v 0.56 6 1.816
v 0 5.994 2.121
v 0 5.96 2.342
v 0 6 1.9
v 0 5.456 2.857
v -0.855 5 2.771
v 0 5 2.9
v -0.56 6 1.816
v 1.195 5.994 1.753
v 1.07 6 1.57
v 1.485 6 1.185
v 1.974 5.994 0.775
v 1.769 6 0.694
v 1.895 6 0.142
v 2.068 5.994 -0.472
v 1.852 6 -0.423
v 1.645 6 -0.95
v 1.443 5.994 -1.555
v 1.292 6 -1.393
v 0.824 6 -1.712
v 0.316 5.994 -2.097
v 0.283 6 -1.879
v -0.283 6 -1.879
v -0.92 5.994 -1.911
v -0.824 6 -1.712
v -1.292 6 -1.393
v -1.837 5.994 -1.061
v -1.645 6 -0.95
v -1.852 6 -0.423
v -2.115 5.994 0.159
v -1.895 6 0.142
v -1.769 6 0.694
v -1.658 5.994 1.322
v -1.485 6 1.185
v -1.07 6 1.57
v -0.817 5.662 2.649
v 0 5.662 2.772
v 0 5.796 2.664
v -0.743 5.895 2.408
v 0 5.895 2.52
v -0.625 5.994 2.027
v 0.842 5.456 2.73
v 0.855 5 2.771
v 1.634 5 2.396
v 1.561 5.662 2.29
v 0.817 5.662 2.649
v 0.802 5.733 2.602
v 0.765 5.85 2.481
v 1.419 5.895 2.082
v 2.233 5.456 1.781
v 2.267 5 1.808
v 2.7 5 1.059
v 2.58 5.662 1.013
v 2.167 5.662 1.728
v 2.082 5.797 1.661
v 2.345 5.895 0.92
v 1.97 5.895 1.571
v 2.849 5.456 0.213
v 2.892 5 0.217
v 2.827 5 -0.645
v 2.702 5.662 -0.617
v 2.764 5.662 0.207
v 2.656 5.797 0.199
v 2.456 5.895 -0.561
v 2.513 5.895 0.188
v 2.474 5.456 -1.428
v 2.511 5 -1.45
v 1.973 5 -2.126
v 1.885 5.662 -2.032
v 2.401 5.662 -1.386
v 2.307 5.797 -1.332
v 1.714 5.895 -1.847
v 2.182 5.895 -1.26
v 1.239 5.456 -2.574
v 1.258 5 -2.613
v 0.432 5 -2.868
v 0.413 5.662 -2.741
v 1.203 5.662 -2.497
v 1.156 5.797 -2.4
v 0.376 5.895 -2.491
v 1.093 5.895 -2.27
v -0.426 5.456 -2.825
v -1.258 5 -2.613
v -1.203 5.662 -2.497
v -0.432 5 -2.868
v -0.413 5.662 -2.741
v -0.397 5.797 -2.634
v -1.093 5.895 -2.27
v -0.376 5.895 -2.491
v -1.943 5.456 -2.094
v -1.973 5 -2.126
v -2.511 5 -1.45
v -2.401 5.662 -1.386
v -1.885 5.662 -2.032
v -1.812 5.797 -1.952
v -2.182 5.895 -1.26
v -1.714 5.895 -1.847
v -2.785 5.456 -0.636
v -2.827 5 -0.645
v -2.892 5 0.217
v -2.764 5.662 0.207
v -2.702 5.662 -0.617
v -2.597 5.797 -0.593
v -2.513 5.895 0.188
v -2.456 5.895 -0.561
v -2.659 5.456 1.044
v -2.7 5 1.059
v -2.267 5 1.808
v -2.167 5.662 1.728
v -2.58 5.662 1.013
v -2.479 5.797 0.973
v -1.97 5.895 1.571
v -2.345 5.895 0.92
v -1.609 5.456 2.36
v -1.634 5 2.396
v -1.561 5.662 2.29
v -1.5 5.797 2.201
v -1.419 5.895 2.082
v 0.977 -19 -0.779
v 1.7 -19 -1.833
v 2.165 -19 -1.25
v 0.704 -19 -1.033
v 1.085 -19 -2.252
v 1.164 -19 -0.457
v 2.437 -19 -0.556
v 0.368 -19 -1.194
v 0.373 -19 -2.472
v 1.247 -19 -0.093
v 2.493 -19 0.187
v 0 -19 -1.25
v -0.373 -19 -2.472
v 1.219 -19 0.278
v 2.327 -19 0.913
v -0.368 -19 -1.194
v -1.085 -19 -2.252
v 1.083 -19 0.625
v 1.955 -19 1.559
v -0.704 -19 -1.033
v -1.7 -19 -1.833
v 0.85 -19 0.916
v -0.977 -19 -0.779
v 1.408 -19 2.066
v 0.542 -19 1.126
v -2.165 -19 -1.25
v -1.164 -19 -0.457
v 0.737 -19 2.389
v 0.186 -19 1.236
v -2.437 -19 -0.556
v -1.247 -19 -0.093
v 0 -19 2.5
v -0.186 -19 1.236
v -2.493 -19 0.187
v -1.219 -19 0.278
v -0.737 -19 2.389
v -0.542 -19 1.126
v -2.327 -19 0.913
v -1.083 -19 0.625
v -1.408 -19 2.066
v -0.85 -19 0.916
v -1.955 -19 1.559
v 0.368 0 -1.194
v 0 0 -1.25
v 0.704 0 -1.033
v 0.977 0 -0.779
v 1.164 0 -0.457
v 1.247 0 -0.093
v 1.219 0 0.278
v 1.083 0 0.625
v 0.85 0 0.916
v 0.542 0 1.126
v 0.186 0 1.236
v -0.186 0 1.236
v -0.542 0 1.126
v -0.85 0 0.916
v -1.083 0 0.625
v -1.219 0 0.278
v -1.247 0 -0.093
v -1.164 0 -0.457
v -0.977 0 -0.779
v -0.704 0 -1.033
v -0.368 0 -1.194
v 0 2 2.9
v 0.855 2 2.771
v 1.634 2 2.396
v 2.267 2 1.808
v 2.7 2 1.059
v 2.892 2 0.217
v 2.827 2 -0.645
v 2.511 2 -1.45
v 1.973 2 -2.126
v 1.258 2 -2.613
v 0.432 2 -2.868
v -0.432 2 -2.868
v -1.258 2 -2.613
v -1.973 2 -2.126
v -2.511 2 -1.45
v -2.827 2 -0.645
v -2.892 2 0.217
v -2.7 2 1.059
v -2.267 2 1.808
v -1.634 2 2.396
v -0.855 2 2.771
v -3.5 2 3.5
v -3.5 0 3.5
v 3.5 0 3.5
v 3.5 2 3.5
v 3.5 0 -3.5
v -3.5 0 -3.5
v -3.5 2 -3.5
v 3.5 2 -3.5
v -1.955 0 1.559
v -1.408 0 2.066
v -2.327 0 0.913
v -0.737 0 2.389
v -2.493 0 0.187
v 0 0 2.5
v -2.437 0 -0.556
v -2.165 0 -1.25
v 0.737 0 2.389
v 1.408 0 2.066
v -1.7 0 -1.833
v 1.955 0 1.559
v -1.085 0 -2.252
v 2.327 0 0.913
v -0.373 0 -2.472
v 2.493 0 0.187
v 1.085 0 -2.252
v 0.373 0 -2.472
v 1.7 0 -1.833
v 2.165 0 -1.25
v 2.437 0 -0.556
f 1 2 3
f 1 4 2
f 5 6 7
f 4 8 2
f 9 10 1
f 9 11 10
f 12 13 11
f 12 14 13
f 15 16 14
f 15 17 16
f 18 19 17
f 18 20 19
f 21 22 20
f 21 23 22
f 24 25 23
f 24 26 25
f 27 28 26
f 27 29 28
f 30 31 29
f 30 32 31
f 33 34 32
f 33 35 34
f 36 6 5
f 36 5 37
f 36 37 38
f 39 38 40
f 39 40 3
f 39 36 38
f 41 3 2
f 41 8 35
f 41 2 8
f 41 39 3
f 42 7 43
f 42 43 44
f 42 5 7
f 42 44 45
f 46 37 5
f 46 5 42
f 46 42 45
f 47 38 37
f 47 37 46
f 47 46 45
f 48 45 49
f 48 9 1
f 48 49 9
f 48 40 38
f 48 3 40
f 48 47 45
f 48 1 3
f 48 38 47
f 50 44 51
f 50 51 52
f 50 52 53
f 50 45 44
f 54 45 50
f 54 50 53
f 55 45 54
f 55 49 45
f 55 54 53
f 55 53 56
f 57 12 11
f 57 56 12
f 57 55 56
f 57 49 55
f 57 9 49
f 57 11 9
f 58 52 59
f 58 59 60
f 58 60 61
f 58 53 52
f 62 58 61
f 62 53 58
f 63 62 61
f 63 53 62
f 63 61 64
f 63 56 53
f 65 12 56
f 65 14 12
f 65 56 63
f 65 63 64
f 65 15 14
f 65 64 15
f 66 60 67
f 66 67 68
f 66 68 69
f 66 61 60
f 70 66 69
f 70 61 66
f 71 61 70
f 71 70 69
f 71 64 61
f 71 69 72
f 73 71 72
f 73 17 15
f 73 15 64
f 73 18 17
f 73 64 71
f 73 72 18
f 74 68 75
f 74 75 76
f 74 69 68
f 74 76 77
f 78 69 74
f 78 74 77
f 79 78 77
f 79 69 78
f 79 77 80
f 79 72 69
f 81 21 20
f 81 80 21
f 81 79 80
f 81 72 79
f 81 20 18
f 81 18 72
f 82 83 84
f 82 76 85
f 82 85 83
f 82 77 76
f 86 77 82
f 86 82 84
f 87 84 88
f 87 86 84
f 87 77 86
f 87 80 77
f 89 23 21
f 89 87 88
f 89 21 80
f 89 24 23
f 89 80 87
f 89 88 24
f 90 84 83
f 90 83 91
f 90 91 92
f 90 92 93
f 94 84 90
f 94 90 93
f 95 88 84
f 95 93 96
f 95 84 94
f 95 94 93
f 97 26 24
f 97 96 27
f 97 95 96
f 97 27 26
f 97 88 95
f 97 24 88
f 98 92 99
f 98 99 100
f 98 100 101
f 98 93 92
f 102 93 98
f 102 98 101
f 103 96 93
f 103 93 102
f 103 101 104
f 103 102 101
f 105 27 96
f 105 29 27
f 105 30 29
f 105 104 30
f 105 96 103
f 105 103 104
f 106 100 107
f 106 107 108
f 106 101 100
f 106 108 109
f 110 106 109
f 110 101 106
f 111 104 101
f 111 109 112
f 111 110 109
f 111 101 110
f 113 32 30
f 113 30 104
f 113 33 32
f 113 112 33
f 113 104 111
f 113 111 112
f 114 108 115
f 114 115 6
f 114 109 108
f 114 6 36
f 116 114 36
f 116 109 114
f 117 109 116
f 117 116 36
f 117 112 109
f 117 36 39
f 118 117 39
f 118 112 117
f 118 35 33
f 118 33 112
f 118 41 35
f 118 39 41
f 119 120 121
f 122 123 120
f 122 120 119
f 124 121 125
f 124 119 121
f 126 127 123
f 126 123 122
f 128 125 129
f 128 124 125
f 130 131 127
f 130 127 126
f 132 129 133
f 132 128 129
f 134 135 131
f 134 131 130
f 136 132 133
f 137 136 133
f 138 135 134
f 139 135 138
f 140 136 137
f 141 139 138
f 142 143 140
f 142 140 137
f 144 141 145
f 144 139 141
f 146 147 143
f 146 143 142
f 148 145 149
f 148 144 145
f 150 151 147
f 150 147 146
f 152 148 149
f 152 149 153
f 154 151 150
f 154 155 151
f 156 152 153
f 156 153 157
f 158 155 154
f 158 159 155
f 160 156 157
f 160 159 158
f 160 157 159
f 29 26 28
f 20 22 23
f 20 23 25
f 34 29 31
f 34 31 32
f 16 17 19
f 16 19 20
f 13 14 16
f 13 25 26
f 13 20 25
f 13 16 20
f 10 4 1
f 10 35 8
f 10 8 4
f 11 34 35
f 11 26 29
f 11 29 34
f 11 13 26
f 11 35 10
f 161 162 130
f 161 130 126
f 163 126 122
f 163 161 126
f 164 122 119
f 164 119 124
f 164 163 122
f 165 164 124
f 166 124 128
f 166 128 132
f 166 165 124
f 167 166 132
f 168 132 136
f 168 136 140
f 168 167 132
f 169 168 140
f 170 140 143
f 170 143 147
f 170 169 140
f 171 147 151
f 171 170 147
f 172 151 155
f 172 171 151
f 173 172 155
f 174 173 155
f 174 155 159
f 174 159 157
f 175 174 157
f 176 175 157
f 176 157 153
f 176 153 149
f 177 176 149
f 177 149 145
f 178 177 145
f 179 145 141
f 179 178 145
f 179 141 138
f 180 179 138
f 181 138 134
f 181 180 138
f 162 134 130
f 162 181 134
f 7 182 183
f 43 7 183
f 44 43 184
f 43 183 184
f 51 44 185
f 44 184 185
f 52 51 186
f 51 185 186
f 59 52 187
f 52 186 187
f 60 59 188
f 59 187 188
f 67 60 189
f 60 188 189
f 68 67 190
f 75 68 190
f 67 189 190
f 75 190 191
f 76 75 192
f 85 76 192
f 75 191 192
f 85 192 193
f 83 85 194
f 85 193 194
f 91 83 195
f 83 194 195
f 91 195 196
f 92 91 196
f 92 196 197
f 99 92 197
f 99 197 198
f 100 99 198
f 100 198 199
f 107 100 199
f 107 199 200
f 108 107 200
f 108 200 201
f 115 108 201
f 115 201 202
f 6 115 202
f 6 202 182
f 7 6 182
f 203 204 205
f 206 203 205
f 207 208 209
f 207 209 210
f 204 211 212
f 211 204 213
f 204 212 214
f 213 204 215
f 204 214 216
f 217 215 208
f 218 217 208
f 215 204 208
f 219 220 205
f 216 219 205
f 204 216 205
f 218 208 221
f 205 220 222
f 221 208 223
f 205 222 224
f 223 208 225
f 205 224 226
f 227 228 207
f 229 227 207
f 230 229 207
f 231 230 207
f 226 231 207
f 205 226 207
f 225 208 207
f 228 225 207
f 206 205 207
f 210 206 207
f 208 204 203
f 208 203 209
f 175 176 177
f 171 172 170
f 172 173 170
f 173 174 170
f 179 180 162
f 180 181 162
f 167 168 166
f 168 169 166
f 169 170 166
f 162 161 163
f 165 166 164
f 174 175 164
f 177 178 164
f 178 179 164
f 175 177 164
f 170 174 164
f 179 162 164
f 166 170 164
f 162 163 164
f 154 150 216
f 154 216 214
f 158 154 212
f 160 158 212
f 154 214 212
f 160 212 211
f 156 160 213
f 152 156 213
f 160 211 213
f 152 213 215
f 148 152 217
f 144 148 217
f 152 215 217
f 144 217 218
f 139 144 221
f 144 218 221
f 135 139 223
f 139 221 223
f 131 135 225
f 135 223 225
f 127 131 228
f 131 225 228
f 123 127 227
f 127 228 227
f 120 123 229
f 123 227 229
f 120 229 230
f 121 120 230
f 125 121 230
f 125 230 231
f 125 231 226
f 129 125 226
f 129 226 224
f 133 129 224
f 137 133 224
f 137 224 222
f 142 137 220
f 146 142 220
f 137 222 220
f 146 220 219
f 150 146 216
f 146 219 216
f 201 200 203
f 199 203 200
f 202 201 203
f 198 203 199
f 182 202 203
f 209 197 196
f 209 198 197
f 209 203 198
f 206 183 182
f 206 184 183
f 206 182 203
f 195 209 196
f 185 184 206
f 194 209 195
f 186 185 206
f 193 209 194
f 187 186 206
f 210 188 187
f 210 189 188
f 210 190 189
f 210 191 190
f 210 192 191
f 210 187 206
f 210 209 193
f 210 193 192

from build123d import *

# Parameters (mm, degrees)
SKETCH8_W           = 7
SKETCH8_H           = 7
BOSS_EXTRUDE3_DEPTH = 2
SKETCH9_R           = 2.9
BOSS_EXTRUDE4_DEPTH = 4
SKETCH10_R          = 2.5
SKETCH10_R_2        = 1.25
BOSS_EXTRUDE5_DEPTH = 19
FILLET1_SIZE        = 1


with BuildPart() as part:
    # Sketch8 → Boss-Extrude3 (new body)
    with BuildSketch(Plane(origin=(0, 0, 0), x_dir=(1, 0, 0), z_dir=(0, 1, 0))):
        Rectangle(SKETCH8_W, SKETCH8_H)
    extrude(amount=BOSS_EXTRUDE3_DEPTH)

    # Sketch9 → Boss-Extrude4 (add)
    with BuildSketch(Plane(origin=(0, 2, 0), x_dir=(1, 0, 0), z_dir=(0, 1, 0))):
        with Locations(Location((0, 0, 0), (0, 0, 270))):
            Circle(SKETCH9_R)
    extrude(amount=BOSS_EXTRUDE4_DEPTH)

    # Sketch10 → Boss-Extrude5 (add)
    with BuildSketch(Plane.XZ):
        with Locations(Location((0, 0, 0), (0, 0, 90))):
            Circle(SKETCH10_R)
        with Locations(Location((0, 0, 0), (0, 0, 270))):
            Circle(SKETCH10_R_2, mode=Mode.SUBTRACT)
    extrude(amount=BOSS_EXTRUDE5_DEPTH)

    # Fillet1
    # a fillet whose section is not a circle: 1 mm, written as the material it takes off along each edge
    with BuildSketch(Plane(origin=(0, 6, 0), x_dir=(0, 0, 1), z_dir=(-1, 0, 0))) as fillet1_piece_1:
        with BuildLine():
            add(Edge.make_bspline([(2.9, -FILLET1_SIZE), (2.9, -FILLET1_SIZE * 0.831801948466), (2.9, -FILLET1_SIZE * 0.663603896932), (2.9 - FILLET1_SIZE * 0.0716919198361, -FILLET1_SIZE * 0.292893218813), (2.9 - FILLET1_SIZE * 0.292893218813, -FILLET1_SIZE * 0.0716919198361), (2.9 - FILLET1_SIZE * 0.663603896932, 0), (2.9 - FILLET1_SIZE * 0.831801948466, 0), (2.9 - FILLET1_SIZE, 0)], knots=[0, 0, 0, 0, 0, 0, 0.5, 0.5, 1, 1, 1, 1, 1, 1], degree=5))
            Line((2.9 - FILLET1_SIZE, 0), (2.9, 0))
            Line((2.9, 0), (2.9, -FILLET1_SIZE))
        make_face()
    revolve(axis=Axis((0, 6, 0), (0, 1, 0)), mode=Mode.SUBTRACT)


solid = part.part
